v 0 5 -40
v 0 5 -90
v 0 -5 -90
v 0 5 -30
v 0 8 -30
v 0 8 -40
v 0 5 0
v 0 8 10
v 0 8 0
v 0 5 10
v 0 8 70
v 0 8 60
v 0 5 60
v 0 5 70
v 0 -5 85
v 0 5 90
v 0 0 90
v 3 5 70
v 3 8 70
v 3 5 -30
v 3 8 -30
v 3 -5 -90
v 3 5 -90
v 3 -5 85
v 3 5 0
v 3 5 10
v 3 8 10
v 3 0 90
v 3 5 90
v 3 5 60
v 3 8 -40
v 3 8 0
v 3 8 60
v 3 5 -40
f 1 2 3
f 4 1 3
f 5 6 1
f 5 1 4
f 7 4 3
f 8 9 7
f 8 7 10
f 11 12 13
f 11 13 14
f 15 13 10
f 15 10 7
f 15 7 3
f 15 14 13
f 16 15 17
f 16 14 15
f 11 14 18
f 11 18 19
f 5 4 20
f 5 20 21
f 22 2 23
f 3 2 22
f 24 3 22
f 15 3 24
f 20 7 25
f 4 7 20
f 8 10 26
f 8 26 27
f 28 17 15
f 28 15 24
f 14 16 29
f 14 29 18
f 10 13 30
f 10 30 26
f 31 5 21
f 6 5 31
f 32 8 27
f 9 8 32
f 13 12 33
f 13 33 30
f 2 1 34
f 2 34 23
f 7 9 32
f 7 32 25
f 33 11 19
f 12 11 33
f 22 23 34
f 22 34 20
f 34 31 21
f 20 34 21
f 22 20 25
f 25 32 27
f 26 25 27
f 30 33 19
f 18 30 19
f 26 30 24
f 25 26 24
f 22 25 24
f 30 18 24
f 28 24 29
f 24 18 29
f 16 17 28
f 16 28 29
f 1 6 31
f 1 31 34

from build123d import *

# Parameters (mm, degrees)
BOSS_EXTRUDE1_DEPTH = 3
CHAMFER1_SIZE       = 5


with BuildPart() as part:
    # Sketch1 → Boss-Extrude1 (new body)
    with BuildSketch(Plane(origin=(0, 0, 0), x_dir=(0, 0, -1), z_dir=(1, 0, 0))):
        Polygon((-60, 5), (-10, 5), (-10, 8), (0, 8), (0, 5), (30, 5), (30, 8), (40, 8), (40, 5), (90, 5), (90, -5), (-90, -5), (-90, 5), (-70, 5), (-70, 8), (-60, 8), align=None)
    extrude(amount=BOSS_EXTRUDE1_DEPTH)

    # Chamfer1
    chamfer1_edges = [part.edges().sort_by_distance(p)[0] for p in [
        (1.5, -5, 90),
    ]]
    chamfer(chamfer1_edges, length=CHAMFER1_SIZE)


solid = part.part
